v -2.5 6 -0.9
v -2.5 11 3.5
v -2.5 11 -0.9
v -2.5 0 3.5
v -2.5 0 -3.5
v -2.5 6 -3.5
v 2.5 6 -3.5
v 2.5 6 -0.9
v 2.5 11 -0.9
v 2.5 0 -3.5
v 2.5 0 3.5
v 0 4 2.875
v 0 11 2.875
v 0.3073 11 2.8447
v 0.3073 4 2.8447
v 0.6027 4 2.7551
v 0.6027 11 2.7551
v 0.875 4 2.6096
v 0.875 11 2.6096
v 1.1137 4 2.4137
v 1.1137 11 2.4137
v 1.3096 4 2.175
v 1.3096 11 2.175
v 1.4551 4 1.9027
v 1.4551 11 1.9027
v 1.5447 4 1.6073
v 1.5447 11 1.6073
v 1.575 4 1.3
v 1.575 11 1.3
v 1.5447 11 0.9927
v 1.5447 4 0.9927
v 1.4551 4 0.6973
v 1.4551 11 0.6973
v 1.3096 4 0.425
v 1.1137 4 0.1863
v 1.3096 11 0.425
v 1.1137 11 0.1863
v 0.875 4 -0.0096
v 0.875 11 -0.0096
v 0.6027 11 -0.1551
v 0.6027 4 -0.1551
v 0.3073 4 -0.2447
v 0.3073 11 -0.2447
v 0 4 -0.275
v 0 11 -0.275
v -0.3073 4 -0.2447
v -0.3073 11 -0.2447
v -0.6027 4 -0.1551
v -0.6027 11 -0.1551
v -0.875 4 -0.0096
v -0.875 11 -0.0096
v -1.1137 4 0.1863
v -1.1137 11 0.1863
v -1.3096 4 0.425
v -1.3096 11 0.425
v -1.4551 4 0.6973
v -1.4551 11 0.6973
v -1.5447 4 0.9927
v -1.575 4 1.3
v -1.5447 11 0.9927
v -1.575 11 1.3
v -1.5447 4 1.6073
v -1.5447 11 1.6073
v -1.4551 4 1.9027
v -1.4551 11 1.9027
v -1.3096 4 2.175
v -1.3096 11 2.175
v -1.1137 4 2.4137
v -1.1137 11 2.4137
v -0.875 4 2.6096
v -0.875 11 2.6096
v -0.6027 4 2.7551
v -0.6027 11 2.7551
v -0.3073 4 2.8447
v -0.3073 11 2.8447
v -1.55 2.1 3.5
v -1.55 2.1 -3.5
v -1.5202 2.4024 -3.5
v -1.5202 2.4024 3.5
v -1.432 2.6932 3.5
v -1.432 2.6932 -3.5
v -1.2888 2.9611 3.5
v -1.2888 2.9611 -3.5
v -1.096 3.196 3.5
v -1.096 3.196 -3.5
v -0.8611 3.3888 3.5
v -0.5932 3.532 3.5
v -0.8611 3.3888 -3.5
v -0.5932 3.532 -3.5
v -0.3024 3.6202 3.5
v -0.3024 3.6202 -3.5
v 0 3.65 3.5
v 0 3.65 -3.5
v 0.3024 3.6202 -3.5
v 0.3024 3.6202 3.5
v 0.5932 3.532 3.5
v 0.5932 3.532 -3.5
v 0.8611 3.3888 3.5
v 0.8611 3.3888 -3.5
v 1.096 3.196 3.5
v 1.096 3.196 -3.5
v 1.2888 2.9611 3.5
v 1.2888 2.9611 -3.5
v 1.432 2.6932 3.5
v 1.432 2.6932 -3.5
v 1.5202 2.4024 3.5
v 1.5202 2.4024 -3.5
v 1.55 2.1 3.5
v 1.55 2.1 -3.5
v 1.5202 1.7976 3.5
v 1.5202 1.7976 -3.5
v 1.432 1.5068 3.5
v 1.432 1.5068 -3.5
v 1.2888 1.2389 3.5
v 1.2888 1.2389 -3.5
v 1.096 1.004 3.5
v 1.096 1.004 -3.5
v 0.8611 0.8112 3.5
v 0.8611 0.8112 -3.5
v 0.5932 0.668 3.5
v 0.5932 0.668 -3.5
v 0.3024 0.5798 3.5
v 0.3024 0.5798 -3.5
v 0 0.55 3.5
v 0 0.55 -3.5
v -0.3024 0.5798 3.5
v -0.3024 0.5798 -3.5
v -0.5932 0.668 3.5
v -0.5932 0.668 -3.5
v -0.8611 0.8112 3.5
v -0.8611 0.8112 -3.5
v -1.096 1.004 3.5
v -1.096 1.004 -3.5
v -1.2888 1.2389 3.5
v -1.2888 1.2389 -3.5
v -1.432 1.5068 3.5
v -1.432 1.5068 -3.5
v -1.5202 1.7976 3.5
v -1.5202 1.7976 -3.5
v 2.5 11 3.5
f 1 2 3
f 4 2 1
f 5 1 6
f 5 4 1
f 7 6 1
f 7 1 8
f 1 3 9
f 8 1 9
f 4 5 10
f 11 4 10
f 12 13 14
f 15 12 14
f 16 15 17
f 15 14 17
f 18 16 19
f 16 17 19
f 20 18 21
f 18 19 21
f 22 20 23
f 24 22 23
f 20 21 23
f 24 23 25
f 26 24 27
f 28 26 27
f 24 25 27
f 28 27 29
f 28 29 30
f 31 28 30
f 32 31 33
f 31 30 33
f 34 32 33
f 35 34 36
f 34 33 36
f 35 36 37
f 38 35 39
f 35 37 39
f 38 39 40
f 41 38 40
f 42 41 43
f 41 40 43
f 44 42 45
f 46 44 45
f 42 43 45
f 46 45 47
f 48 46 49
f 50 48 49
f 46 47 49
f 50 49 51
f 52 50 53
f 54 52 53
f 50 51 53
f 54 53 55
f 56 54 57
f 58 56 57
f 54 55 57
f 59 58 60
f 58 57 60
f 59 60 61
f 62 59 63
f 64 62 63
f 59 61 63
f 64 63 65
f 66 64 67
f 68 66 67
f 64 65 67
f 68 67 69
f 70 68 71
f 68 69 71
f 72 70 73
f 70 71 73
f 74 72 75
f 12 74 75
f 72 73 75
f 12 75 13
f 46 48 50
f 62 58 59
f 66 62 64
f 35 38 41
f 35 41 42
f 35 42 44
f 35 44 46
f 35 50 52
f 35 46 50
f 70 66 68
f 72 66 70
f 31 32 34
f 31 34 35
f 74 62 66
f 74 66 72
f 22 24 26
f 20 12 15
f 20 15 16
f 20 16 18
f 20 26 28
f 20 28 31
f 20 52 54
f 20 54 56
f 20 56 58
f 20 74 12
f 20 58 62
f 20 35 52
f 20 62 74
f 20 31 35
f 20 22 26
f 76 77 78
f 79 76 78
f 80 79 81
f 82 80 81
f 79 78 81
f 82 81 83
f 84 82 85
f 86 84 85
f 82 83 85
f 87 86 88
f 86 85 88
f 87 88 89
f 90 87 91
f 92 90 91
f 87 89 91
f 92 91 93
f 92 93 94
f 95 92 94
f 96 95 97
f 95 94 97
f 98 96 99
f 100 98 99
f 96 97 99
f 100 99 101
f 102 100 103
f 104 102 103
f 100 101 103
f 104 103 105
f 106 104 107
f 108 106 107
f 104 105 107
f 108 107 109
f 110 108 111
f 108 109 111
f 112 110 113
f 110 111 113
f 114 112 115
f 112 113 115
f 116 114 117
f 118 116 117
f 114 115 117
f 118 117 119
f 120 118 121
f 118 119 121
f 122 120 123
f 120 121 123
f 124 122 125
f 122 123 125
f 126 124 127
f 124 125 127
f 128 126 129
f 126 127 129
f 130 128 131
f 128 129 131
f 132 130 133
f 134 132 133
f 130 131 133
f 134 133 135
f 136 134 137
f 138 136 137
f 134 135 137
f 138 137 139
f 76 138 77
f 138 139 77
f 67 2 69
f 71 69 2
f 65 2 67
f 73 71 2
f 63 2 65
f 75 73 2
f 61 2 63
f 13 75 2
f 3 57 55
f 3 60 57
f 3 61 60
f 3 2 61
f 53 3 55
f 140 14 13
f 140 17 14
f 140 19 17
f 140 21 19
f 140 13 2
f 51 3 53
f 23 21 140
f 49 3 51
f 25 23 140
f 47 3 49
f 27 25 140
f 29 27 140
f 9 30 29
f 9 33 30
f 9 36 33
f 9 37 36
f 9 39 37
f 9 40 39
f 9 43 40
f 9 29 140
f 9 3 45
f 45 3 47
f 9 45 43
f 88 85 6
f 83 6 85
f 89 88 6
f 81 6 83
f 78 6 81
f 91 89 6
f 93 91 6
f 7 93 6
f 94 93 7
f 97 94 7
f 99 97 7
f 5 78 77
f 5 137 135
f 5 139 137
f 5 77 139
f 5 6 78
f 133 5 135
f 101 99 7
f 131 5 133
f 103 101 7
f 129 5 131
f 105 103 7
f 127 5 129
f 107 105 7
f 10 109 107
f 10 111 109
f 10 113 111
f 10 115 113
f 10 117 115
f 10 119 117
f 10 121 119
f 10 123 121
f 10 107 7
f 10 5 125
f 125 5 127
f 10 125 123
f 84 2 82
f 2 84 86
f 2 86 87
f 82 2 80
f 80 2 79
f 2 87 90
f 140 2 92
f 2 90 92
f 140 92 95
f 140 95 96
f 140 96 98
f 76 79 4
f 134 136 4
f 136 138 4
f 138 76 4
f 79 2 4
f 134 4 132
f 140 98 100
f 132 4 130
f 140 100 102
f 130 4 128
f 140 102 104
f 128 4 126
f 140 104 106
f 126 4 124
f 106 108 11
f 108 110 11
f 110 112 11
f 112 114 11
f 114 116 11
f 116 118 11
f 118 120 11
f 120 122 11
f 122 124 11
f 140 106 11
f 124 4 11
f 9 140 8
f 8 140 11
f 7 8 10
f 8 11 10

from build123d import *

# Parameters (mm, degrees)
SKETCH_1_W          = 5
SKETCH_1_H          = 7
EXTRUDE_1_DEPTH     = 11
SKETCH_3_R          = 1.575
CUT_EXTRUDE_1_DEPTH = 7
SKETCH_4_R          = 1.55
CUT_EXTRUDE_2_DEPTH = 7
SKETCH_5_W          = 5
SKETCH_5_H          = 2.6
CUT_EXTRUDE_3_DEPTH = 5


with BuildPart() as part:
    # Эскиз1 → Бобышка-Вытянуть1 (new body)
    with BuildSketch(Plane(origin=(0, 0, 0), x_dir=(1, 0, 0), z_dir=(0, 1, 0))):
        Rectangle(SKETCH_1_W, SKETCH_1_H)
    extrude(amount=EXTRUDE_1_DEPTH)

    # Эскиз3 → Вырез-Вытянуть1 (cut)
    with BuildSketch(Plane(origin=(0, 11, 0), x_dir=(1, 0, 0), z_dir=(0, 1, 0))):
        with Locations(Location((0, -1.3, 0), (0, 0, 270))):
            Circle(SKETCH_3_R)
    extrude(amount=-CUT_EXTRUDE_1_DEPTH, mode=Mode.SUBTRACT)

    # Эскиз4 → Вырез-Вытянуть2 (cut)
    with BuildSketch(Plane(origin=(0, 0, -3.5), x_dir=(-1, 0, 0), z_dir=(0, 0, -1))):
        with Locations((0, 2.1)):
            Circle(SKETCH_4_R)
    extrude(amount=-CUT_EXTRUDE_2_DEPTH, mode=Mode.SUBTRACT)

    # Эскиз5 → Вырез-Вытянуть3 (cut)
    with BuildSketch(Plane(origin=(0, 11, 0), x_dir=(1, 0, 0), z_dir=(0, 1, 0))):
        with Locations((0, 2.2)):
            Rectangle(SKETCH_5_W, SKETCH_5_H)
    extrude(amount=-CUT_EXTRUDE_3_DEPTH, mode=Mode.SUBTRACT)


solid = part.part
